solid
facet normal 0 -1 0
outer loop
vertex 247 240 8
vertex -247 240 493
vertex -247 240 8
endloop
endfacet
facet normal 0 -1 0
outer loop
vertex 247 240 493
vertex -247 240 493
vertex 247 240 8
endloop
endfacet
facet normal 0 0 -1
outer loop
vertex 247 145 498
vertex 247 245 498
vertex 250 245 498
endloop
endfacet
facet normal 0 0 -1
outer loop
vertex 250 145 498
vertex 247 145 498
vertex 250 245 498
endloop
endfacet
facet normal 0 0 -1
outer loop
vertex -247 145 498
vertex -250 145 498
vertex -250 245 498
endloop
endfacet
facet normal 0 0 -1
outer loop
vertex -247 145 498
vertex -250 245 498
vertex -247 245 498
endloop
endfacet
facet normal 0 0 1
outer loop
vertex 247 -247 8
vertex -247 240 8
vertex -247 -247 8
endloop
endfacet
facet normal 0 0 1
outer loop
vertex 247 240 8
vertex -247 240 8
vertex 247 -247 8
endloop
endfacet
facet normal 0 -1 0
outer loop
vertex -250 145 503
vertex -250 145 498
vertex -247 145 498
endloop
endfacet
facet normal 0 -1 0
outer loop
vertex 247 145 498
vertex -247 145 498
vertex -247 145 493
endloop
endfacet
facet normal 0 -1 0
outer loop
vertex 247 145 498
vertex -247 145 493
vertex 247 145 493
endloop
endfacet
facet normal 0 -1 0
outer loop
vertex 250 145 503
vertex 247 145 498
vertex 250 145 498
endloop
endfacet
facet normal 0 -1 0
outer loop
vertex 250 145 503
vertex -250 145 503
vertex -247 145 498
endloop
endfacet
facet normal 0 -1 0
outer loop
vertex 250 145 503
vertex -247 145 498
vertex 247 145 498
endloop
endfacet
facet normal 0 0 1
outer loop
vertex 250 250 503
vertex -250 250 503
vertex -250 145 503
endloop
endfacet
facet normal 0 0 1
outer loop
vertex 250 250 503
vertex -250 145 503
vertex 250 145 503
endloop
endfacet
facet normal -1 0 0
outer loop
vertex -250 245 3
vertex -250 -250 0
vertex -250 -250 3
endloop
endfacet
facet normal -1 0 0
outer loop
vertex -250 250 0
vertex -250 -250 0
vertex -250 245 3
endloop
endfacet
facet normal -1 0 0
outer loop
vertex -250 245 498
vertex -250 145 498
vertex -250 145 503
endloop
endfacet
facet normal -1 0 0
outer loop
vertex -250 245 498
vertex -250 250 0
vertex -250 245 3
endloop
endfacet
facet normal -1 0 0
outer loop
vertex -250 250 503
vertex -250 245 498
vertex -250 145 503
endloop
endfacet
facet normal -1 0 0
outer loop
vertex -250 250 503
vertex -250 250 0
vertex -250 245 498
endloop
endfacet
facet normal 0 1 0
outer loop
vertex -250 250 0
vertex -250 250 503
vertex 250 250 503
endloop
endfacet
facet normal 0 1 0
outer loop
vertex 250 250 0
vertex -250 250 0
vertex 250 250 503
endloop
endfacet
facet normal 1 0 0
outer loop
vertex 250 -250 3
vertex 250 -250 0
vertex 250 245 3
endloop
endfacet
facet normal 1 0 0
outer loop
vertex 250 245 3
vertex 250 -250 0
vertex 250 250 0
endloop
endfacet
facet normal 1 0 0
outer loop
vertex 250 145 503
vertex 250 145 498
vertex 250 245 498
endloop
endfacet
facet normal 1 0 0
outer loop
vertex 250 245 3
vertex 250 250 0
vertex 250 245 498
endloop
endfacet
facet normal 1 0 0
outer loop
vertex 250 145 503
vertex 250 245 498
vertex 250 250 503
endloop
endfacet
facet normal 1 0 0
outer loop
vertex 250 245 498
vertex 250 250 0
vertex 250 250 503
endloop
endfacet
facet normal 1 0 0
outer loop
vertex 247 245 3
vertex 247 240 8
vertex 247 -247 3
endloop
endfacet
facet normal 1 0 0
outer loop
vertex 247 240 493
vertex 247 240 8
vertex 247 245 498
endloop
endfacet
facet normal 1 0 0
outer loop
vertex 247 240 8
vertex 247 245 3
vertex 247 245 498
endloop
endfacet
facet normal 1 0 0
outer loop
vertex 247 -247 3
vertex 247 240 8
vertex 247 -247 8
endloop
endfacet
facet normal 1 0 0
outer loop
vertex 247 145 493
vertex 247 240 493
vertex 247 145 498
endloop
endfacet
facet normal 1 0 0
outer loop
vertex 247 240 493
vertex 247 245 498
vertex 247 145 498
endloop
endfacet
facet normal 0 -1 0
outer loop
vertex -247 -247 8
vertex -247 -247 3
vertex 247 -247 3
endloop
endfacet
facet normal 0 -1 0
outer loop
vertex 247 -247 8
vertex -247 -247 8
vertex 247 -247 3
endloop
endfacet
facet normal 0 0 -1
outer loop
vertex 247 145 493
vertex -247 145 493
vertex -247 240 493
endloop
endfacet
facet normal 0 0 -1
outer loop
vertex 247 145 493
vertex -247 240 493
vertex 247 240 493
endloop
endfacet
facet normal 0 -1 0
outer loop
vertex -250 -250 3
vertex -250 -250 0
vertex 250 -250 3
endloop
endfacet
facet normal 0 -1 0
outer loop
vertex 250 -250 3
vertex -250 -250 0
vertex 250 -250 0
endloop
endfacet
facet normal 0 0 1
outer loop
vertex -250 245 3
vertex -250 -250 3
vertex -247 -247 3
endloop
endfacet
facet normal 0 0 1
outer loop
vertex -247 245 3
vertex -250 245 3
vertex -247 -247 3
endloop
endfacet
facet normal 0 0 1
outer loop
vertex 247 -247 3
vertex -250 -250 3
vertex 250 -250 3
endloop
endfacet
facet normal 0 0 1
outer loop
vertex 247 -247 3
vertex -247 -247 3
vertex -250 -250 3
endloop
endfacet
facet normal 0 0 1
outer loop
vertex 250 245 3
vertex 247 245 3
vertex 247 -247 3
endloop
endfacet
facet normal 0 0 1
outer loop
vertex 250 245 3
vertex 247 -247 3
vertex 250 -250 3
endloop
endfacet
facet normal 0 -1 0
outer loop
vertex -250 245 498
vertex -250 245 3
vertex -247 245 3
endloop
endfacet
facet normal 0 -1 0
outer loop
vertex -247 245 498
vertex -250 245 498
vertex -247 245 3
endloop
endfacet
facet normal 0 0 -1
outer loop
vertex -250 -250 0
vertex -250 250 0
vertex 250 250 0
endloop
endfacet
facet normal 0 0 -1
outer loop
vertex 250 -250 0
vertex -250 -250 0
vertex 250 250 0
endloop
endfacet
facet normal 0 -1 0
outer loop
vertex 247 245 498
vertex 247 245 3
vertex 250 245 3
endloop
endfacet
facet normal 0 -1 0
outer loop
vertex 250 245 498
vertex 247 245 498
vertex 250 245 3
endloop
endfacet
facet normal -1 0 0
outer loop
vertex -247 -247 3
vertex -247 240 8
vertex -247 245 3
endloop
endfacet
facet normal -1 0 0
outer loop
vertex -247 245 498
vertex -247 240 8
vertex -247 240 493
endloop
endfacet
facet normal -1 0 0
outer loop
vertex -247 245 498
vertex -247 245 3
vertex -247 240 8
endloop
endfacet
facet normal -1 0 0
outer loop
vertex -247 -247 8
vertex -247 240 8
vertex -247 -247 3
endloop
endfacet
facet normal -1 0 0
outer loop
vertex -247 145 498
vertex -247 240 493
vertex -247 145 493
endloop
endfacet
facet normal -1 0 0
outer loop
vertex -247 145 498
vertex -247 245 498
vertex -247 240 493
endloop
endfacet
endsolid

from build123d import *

# Parameters (mm, degrees)
F0_W      = 500
F0_H      = 500
F1_DEPTH  = 3
F2_W      = 494
F2_H      = 492
F3_DEPTH  = 5
F4_W      = 500
F4_H      = 5
F5_DEPTH  = 500
F6_W      = 494
F6_H      = 490
F7_DEPTH  = 5
F8_W      = 500
F8_H      = 5
F9_DEPTH  = 100
F10_W     = 494
F10_H     = 95
F12_DEPTH = 5


with BuildPart() as f1:
    # F0 (on Top) → F1 (new body)
    with BuildSketch(Plane.XY):
        Rectangle(F0_W, F0_H)
    extrude(amount=F1_DEPTH)

    # F2 (on face) → F3 (join)
    with BuildSketch(Plane.XY.offset(3)):
        with Locations((0, -1)):
            Rectangle(F2_W, F2_H)
    extrude(amount=F3_DEPTH)

    # F4 (on face) → F5 (join)
    with BuildSketch(Plane.XY.offset(3)):
        with Locations((0, 247.5)):
            Rectangle(F4_W, F4_H)
    extrude(amount=F5_DEPTH)

    # F6 (on face) → F7 (join)
    with BuildSketch(Plane.XZ.offset(-245)):
        with Locations((0, 253)):
            Rectangle(F6_W, F6_H)
    extrude(amount=F7_DEPTH)

    # F8 (on face) → F9 (join)
    with BuildSketch(Plane.XZ.offset(-245)):
        with Locations((0, 500.5)):
            Rectangle(F8_W, F8_H)
    extrude(amount=F9_DEPTH)

    # F10 (on face) → F12 (join)
    with BuildSketch(Plane(origin=(0, 0, 498), x_dir=(1, 0, 0), z_dir=(0, 0, -1))):
        with Locations((0, -192.5)):
            Rectangle(F10_W, F10_H)
    extrude(amount=F12_DEPTH)


solid = f1.part
